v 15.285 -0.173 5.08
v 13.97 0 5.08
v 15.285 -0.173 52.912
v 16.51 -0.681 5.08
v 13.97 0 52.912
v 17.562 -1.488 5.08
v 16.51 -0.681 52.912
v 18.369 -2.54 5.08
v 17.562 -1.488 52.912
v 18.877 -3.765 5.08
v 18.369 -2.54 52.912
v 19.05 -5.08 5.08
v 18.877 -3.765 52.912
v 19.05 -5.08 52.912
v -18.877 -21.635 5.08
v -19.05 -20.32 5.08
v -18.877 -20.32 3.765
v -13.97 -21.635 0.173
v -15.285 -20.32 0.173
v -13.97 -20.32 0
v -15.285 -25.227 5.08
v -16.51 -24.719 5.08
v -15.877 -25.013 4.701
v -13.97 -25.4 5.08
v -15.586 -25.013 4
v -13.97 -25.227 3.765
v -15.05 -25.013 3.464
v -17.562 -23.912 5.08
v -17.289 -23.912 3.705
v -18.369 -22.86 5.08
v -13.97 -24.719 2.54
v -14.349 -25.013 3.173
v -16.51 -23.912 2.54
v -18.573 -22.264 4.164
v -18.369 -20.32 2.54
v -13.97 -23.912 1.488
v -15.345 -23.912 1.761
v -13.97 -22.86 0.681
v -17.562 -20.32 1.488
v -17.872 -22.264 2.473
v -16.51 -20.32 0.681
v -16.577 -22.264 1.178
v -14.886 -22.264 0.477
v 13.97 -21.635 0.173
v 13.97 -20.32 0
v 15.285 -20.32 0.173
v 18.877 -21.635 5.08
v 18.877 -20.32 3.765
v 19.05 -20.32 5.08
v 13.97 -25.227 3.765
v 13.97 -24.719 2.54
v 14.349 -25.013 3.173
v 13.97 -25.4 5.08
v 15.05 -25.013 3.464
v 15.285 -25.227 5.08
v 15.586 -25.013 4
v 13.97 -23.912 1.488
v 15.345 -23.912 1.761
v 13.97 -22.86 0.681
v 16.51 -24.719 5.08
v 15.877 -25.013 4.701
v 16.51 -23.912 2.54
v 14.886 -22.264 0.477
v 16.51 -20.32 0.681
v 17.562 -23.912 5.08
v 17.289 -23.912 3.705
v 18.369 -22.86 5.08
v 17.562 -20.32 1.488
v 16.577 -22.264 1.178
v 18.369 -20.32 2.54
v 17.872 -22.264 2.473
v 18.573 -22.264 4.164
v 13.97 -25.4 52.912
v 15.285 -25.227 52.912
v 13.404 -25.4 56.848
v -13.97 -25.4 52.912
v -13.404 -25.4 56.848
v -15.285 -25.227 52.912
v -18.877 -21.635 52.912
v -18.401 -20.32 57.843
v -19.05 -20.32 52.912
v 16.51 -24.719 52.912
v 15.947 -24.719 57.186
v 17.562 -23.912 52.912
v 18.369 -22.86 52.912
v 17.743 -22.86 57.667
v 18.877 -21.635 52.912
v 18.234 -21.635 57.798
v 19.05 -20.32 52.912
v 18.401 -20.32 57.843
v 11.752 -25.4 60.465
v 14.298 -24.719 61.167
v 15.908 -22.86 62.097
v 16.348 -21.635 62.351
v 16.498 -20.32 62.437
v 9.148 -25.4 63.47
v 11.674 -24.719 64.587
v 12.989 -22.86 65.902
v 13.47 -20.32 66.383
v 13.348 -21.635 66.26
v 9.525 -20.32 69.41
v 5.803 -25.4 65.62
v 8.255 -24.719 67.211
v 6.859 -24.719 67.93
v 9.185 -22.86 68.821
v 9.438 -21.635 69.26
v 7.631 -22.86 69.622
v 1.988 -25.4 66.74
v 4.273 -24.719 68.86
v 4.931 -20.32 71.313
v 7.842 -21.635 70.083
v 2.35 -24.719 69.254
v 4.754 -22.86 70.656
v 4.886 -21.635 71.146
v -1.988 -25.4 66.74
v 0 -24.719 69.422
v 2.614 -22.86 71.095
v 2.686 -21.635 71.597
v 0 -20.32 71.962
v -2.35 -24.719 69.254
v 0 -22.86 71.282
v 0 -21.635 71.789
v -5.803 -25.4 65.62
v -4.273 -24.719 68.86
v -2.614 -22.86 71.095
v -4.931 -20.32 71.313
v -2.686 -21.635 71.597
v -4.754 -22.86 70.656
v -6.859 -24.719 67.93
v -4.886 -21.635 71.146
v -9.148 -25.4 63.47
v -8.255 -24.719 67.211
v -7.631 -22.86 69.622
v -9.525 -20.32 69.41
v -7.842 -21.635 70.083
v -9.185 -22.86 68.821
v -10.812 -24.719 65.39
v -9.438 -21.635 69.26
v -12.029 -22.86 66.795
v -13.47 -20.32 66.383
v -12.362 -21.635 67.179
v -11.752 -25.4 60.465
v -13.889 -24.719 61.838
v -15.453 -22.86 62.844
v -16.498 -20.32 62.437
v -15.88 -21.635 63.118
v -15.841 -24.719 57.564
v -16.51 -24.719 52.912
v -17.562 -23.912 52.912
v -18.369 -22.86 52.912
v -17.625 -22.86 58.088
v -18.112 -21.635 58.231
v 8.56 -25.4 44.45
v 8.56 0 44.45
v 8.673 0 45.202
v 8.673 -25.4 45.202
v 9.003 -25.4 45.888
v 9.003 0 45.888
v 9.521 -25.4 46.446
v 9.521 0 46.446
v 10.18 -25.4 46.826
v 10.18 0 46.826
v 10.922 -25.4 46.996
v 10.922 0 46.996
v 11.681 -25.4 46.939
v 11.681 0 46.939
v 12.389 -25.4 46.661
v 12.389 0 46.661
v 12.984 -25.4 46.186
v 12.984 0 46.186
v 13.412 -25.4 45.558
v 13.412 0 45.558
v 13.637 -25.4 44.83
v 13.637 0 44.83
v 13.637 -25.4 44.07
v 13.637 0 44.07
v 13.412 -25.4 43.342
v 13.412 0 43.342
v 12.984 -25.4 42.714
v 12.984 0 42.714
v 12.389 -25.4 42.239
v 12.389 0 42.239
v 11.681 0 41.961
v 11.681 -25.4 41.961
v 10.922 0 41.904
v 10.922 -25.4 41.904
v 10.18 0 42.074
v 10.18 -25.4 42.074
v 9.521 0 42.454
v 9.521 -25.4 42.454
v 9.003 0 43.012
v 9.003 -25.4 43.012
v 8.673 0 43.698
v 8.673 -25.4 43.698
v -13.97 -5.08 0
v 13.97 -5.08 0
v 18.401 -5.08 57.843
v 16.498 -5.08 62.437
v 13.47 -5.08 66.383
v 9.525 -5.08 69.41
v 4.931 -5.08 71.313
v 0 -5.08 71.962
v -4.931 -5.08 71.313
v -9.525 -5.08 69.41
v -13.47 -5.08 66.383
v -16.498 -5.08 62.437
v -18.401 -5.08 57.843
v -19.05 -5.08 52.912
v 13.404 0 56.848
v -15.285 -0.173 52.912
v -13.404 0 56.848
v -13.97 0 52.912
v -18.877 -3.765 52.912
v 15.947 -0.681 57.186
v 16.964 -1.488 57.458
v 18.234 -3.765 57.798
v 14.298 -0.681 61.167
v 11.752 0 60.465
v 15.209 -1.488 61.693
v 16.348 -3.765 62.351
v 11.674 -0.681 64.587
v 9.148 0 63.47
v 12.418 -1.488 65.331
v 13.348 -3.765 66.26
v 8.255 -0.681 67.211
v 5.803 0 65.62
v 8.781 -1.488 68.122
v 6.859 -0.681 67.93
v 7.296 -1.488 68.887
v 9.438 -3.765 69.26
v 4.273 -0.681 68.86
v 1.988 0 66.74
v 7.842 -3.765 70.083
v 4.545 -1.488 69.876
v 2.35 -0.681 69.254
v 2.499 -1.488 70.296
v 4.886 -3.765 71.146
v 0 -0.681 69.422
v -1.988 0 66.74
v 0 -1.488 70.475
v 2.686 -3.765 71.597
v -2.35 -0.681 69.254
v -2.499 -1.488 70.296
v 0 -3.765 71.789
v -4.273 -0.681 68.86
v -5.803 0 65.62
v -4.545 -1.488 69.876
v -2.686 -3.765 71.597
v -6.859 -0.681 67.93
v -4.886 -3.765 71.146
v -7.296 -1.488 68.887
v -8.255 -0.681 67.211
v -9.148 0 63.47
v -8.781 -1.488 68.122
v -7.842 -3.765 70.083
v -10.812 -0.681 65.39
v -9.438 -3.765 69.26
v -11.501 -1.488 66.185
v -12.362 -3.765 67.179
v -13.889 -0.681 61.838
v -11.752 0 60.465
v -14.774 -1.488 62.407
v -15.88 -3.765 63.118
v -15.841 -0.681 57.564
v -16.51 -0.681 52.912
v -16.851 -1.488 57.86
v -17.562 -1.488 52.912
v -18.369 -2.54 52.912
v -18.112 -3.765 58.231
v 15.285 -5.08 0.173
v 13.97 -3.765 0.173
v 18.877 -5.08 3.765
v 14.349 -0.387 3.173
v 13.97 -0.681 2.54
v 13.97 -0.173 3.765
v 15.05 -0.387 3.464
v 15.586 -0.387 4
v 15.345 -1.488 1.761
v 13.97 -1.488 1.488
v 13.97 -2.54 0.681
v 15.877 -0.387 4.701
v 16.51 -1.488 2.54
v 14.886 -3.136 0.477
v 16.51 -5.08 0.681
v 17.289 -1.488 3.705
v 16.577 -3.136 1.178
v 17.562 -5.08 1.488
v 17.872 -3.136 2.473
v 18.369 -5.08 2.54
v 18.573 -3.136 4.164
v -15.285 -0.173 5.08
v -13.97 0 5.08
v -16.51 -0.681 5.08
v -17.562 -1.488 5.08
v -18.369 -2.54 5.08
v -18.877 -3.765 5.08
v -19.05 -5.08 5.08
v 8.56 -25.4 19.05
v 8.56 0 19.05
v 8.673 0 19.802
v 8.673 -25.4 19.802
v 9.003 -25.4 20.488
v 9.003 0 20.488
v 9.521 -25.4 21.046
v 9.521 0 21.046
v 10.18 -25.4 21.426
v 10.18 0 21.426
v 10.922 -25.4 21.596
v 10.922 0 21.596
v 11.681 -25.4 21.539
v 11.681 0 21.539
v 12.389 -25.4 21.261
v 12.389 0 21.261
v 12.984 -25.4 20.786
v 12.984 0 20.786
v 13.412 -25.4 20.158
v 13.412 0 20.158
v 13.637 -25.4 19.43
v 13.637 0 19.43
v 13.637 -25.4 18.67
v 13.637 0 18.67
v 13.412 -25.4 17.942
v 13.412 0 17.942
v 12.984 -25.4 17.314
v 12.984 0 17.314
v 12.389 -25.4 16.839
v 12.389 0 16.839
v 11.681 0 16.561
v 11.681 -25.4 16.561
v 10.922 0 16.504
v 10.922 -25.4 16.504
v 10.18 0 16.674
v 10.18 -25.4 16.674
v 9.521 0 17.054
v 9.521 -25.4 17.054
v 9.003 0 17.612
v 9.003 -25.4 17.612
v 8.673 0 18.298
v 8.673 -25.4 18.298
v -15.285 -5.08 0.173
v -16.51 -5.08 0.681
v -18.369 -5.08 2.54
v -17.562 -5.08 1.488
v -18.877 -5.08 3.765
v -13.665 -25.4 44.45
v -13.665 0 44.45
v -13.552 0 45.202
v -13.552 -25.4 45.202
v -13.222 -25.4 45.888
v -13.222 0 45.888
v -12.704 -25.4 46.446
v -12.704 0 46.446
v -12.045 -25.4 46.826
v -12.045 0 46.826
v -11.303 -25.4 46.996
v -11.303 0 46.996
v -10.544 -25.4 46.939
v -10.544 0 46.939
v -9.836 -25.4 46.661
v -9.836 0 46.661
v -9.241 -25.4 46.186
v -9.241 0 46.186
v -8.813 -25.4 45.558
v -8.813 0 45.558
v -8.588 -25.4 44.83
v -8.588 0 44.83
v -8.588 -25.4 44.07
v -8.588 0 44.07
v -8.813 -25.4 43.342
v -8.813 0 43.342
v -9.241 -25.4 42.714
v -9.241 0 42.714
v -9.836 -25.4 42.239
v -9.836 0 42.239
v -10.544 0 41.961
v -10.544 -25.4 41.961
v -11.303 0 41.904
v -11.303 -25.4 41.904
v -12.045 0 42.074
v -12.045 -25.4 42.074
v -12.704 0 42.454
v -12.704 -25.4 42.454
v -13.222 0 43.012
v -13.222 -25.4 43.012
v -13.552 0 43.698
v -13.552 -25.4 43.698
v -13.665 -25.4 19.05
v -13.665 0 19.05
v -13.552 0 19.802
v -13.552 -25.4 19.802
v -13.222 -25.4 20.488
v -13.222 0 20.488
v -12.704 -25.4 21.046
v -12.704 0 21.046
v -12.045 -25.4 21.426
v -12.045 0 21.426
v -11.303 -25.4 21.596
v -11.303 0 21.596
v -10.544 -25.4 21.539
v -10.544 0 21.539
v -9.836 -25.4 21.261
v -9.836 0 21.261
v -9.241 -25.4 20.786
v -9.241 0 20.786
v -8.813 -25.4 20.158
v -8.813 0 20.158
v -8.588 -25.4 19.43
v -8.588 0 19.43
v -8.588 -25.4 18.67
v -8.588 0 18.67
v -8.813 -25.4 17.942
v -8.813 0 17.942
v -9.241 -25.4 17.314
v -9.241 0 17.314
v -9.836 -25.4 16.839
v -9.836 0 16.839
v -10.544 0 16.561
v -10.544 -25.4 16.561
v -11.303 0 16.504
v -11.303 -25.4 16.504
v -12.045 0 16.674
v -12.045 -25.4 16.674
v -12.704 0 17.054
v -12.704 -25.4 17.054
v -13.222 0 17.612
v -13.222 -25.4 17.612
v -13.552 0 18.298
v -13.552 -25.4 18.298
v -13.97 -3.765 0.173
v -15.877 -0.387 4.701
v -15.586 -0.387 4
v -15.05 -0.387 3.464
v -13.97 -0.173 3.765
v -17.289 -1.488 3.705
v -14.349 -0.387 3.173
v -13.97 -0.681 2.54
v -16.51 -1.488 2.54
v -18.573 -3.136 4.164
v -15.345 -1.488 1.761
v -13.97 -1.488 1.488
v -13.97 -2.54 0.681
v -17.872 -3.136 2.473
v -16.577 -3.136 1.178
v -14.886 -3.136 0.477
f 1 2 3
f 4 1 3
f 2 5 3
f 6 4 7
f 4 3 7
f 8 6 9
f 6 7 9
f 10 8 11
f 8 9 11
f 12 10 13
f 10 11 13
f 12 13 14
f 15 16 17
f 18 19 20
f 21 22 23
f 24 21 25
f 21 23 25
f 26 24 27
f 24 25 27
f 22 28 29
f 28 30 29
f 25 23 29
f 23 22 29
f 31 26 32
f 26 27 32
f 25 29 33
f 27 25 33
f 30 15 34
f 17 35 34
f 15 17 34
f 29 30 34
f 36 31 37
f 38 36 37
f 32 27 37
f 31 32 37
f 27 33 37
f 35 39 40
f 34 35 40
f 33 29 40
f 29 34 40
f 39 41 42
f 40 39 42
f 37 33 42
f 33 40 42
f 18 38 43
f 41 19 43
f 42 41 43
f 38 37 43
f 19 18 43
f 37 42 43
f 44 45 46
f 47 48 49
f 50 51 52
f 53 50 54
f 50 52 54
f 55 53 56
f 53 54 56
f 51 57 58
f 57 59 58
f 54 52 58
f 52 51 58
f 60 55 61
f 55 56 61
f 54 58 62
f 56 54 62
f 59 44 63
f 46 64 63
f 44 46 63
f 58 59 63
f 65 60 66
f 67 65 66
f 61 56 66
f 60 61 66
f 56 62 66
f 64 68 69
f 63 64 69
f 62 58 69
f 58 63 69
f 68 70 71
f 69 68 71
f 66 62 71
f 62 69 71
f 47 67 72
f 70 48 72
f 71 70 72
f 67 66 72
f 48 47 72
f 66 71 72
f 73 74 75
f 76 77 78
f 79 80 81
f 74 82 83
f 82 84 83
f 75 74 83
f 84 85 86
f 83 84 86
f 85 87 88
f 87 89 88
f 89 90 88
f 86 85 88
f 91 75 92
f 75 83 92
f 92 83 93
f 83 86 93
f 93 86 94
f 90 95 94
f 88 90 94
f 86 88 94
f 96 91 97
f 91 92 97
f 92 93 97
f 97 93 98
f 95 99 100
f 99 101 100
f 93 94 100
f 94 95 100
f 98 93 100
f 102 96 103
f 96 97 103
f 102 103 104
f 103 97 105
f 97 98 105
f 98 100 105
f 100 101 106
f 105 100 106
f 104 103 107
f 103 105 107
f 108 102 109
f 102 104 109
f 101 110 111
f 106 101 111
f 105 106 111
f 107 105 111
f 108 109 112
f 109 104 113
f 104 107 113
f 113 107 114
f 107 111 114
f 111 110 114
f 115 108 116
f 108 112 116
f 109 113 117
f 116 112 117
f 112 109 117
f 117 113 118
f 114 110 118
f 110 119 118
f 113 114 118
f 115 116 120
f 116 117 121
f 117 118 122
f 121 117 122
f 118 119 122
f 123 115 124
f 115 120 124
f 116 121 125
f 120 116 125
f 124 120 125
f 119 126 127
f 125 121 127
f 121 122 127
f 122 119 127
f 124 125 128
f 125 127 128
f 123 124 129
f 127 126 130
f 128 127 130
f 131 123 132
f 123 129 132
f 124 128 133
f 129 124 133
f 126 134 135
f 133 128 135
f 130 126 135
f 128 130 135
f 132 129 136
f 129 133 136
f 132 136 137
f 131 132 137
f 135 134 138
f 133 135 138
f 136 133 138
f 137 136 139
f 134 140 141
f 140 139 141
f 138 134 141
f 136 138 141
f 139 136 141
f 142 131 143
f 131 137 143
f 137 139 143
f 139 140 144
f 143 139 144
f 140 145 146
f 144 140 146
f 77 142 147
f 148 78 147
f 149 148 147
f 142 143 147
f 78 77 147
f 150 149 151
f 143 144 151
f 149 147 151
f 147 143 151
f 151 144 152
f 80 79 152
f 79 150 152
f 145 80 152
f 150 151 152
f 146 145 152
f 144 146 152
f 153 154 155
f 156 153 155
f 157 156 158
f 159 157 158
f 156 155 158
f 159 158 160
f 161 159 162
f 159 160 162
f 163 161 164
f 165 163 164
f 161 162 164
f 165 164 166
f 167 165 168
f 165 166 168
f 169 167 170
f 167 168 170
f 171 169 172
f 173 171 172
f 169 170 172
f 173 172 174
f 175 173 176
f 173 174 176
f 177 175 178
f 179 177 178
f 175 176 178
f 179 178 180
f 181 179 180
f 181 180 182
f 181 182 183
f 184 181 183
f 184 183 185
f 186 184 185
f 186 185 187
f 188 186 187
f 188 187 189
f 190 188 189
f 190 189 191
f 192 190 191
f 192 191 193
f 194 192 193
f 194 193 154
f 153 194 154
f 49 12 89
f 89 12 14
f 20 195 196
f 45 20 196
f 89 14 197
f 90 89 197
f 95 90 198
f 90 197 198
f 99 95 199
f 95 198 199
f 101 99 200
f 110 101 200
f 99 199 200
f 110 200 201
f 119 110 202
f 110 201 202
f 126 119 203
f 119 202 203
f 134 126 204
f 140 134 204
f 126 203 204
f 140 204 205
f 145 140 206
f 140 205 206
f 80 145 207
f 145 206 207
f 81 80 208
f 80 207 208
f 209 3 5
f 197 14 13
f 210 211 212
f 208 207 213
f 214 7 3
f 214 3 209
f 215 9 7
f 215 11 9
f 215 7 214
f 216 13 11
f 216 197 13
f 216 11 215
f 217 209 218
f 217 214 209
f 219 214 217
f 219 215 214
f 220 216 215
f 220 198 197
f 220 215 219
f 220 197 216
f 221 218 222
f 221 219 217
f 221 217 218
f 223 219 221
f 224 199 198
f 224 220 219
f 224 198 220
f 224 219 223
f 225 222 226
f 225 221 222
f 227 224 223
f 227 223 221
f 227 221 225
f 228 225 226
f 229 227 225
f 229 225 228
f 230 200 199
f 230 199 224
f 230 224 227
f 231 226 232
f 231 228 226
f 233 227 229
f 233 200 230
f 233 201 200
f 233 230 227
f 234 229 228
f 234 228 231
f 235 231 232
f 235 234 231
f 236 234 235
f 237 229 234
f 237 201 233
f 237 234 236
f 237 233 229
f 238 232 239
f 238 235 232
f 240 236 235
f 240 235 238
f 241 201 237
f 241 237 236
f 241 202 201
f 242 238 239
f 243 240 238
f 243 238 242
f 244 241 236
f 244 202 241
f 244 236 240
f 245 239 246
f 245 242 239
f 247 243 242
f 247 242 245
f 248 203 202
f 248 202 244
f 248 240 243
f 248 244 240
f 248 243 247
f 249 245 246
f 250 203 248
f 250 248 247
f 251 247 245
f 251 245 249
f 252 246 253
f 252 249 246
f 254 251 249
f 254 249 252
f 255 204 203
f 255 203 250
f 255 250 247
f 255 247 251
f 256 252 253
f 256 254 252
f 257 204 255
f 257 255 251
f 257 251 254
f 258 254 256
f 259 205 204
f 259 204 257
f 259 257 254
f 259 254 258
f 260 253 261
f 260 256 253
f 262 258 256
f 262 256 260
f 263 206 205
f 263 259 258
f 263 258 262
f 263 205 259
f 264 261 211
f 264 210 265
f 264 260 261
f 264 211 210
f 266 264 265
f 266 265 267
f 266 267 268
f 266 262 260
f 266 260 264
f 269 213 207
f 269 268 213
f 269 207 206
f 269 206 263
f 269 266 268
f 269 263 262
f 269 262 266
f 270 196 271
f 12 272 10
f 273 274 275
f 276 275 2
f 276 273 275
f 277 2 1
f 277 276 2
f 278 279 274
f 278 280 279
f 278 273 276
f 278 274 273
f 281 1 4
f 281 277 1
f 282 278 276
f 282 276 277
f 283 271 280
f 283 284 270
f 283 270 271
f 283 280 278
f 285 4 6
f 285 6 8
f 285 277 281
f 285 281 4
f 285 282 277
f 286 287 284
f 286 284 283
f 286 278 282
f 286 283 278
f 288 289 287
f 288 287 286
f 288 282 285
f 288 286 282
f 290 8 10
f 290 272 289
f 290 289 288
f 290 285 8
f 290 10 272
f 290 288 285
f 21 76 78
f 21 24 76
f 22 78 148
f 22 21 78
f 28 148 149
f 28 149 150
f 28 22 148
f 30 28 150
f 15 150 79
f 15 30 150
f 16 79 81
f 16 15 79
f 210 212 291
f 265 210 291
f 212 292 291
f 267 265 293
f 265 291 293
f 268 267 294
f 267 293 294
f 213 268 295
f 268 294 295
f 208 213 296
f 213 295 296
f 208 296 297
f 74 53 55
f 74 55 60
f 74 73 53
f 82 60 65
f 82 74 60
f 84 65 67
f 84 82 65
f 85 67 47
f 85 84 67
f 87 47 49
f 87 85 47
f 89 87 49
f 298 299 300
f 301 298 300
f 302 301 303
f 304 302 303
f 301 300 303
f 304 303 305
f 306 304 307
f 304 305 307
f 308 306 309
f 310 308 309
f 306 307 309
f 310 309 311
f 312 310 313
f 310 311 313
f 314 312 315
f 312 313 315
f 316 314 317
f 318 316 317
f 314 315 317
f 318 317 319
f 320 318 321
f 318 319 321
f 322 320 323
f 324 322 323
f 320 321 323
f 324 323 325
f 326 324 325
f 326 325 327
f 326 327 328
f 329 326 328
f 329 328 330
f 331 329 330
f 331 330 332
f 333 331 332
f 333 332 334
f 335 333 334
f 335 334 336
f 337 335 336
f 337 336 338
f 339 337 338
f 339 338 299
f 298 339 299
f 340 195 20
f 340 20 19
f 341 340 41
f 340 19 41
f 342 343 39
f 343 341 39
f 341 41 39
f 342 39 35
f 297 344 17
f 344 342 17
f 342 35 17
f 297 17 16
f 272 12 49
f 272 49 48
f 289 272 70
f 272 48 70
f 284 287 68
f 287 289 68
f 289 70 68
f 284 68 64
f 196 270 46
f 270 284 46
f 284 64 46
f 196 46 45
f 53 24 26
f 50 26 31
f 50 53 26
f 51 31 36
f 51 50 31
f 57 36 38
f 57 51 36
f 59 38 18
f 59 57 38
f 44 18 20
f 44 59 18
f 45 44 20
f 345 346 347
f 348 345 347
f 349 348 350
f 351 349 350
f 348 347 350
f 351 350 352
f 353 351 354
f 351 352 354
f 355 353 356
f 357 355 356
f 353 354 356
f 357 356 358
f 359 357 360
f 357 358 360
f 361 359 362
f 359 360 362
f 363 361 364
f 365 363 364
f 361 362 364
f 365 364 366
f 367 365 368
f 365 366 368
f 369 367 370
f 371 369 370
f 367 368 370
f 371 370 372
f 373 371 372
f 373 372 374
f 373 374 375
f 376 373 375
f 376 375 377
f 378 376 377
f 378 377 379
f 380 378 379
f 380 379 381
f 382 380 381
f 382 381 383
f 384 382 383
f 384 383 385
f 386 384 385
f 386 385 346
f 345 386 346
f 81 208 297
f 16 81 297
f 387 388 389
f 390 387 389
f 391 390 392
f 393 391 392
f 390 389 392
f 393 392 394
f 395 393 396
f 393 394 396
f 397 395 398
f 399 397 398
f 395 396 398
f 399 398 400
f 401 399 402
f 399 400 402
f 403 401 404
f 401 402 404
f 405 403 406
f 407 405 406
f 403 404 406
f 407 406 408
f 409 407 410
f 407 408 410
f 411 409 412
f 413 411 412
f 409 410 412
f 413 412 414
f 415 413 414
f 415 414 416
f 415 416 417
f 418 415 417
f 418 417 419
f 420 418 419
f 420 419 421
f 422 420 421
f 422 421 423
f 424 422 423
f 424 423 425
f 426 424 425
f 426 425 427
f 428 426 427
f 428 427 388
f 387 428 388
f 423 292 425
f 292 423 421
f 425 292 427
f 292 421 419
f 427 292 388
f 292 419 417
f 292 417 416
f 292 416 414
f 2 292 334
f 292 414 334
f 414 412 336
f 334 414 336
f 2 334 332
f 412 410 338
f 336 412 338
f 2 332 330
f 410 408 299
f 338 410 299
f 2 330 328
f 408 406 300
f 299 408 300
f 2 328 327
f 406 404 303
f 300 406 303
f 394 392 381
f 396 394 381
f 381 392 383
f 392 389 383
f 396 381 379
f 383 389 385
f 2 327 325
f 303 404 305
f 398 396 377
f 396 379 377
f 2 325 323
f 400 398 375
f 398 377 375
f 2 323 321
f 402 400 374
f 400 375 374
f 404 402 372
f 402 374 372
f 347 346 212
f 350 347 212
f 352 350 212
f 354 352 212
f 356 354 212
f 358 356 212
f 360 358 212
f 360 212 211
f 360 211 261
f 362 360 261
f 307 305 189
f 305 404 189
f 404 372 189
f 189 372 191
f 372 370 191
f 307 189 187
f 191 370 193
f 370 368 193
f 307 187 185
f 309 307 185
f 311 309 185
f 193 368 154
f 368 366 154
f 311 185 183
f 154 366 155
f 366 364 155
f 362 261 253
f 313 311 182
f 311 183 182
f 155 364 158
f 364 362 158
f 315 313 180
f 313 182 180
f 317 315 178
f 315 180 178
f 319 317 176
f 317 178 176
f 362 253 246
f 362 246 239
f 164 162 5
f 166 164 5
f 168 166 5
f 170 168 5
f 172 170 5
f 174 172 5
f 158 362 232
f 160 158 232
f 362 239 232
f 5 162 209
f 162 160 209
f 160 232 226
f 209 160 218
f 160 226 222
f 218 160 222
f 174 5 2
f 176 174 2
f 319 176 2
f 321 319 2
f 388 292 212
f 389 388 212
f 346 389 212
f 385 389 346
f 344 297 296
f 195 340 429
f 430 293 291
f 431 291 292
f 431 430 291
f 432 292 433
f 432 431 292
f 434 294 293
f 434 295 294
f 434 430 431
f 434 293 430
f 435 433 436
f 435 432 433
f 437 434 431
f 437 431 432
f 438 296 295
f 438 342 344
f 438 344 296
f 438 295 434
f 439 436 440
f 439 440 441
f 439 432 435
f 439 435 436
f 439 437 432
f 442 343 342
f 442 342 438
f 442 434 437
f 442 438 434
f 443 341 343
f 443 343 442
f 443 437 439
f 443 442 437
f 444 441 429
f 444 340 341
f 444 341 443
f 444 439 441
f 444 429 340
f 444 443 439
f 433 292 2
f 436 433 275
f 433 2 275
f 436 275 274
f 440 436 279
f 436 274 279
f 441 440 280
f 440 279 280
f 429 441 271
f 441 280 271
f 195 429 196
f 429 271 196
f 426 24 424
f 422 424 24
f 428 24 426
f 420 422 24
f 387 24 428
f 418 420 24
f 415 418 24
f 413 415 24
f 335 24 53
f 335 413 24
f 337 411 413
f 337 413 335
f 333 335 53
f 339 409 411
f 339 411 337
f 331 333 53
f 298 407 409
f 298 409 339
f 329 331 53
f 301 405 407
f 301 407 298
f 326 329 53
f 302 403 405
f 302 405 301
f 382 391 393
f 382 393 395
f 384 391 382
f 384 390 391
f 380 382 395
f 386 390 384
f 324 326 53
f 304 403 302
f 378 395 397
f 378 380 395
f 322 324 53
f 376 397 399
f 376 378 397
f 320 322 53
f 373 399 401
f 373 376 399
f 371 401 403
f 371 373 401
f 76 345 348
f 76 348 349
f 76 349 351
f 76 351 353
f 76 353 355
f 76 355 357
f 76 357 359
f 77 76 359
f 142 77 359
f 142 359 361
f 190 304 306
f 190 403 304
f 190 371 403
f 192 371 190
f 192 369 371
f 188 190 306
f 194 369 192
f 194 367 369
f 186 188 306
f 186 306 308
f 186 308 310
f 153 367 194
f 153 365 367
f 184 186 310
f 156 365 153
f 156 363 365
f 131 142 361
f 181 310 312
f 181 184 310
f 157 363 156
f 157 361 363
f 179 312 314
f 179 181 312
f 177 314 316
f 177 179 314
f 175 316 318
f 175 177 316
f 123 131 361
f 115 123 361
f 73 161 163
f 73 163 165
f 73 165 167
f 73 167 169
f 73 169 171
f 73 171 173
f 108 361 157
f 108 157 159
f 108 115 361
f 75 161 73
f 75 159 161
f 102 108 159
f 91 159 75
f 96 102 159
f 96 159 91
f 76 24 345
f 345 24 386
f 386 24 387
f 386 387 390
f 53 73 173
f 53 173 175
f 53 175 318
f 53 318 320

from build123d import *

# Parameters (mm, degrees)
F1_DEPTH = 25.4
F3_D     = 5.1054
F4_R     = 5.08
F5_R     = 5.08


with BuildPart() as f1:
    # F0 (on Front) → F1 (new body)
    with BuildSketch(Plane.XZ):
        with BuildLine():
            Line((19.05, 0), (19.05, 52.9124252498))
            ThreePointArc((19.05, 52.9124252498), (0, 71.9624252498), (-19.05, 52.9124252498))
            Line((-19.05, 52.9124252498), (-19.05, 0))
            Line((-19.05, 0), (19.05, 0))
        make_face()
    extrude(amount=F1_DEPTH)

    # F3 (through all)
    with Locations(Plane.XZ.offset(25.4)):
        with Locations((-11.1125, 44.45), (11.1125, 44.45), (11.1125, 19.05), (-11.1125, 19.05)):
            Hole(F3_D / 2)

    # F4
    f4_edges = [f1.edges().sort_by_distance(p)[0] for p in [
        (-19.05, -12.7, 0),
        (19.05, -12.7, 0),
    ]]
    fillet(f4_edges, radius=F4_R)

    # F5
    f5_edges = [f1.edges().sort_by_distance(p)[0] for p in [
        (-19.05, -25.4, 28.996213),
        (0, -25.4, 0),
        (0, 0, 0),
        (19.05, 0, 28.996213),
    ]]
    fillet(f5_edges, radius=F5_R)


solid = f1.part
